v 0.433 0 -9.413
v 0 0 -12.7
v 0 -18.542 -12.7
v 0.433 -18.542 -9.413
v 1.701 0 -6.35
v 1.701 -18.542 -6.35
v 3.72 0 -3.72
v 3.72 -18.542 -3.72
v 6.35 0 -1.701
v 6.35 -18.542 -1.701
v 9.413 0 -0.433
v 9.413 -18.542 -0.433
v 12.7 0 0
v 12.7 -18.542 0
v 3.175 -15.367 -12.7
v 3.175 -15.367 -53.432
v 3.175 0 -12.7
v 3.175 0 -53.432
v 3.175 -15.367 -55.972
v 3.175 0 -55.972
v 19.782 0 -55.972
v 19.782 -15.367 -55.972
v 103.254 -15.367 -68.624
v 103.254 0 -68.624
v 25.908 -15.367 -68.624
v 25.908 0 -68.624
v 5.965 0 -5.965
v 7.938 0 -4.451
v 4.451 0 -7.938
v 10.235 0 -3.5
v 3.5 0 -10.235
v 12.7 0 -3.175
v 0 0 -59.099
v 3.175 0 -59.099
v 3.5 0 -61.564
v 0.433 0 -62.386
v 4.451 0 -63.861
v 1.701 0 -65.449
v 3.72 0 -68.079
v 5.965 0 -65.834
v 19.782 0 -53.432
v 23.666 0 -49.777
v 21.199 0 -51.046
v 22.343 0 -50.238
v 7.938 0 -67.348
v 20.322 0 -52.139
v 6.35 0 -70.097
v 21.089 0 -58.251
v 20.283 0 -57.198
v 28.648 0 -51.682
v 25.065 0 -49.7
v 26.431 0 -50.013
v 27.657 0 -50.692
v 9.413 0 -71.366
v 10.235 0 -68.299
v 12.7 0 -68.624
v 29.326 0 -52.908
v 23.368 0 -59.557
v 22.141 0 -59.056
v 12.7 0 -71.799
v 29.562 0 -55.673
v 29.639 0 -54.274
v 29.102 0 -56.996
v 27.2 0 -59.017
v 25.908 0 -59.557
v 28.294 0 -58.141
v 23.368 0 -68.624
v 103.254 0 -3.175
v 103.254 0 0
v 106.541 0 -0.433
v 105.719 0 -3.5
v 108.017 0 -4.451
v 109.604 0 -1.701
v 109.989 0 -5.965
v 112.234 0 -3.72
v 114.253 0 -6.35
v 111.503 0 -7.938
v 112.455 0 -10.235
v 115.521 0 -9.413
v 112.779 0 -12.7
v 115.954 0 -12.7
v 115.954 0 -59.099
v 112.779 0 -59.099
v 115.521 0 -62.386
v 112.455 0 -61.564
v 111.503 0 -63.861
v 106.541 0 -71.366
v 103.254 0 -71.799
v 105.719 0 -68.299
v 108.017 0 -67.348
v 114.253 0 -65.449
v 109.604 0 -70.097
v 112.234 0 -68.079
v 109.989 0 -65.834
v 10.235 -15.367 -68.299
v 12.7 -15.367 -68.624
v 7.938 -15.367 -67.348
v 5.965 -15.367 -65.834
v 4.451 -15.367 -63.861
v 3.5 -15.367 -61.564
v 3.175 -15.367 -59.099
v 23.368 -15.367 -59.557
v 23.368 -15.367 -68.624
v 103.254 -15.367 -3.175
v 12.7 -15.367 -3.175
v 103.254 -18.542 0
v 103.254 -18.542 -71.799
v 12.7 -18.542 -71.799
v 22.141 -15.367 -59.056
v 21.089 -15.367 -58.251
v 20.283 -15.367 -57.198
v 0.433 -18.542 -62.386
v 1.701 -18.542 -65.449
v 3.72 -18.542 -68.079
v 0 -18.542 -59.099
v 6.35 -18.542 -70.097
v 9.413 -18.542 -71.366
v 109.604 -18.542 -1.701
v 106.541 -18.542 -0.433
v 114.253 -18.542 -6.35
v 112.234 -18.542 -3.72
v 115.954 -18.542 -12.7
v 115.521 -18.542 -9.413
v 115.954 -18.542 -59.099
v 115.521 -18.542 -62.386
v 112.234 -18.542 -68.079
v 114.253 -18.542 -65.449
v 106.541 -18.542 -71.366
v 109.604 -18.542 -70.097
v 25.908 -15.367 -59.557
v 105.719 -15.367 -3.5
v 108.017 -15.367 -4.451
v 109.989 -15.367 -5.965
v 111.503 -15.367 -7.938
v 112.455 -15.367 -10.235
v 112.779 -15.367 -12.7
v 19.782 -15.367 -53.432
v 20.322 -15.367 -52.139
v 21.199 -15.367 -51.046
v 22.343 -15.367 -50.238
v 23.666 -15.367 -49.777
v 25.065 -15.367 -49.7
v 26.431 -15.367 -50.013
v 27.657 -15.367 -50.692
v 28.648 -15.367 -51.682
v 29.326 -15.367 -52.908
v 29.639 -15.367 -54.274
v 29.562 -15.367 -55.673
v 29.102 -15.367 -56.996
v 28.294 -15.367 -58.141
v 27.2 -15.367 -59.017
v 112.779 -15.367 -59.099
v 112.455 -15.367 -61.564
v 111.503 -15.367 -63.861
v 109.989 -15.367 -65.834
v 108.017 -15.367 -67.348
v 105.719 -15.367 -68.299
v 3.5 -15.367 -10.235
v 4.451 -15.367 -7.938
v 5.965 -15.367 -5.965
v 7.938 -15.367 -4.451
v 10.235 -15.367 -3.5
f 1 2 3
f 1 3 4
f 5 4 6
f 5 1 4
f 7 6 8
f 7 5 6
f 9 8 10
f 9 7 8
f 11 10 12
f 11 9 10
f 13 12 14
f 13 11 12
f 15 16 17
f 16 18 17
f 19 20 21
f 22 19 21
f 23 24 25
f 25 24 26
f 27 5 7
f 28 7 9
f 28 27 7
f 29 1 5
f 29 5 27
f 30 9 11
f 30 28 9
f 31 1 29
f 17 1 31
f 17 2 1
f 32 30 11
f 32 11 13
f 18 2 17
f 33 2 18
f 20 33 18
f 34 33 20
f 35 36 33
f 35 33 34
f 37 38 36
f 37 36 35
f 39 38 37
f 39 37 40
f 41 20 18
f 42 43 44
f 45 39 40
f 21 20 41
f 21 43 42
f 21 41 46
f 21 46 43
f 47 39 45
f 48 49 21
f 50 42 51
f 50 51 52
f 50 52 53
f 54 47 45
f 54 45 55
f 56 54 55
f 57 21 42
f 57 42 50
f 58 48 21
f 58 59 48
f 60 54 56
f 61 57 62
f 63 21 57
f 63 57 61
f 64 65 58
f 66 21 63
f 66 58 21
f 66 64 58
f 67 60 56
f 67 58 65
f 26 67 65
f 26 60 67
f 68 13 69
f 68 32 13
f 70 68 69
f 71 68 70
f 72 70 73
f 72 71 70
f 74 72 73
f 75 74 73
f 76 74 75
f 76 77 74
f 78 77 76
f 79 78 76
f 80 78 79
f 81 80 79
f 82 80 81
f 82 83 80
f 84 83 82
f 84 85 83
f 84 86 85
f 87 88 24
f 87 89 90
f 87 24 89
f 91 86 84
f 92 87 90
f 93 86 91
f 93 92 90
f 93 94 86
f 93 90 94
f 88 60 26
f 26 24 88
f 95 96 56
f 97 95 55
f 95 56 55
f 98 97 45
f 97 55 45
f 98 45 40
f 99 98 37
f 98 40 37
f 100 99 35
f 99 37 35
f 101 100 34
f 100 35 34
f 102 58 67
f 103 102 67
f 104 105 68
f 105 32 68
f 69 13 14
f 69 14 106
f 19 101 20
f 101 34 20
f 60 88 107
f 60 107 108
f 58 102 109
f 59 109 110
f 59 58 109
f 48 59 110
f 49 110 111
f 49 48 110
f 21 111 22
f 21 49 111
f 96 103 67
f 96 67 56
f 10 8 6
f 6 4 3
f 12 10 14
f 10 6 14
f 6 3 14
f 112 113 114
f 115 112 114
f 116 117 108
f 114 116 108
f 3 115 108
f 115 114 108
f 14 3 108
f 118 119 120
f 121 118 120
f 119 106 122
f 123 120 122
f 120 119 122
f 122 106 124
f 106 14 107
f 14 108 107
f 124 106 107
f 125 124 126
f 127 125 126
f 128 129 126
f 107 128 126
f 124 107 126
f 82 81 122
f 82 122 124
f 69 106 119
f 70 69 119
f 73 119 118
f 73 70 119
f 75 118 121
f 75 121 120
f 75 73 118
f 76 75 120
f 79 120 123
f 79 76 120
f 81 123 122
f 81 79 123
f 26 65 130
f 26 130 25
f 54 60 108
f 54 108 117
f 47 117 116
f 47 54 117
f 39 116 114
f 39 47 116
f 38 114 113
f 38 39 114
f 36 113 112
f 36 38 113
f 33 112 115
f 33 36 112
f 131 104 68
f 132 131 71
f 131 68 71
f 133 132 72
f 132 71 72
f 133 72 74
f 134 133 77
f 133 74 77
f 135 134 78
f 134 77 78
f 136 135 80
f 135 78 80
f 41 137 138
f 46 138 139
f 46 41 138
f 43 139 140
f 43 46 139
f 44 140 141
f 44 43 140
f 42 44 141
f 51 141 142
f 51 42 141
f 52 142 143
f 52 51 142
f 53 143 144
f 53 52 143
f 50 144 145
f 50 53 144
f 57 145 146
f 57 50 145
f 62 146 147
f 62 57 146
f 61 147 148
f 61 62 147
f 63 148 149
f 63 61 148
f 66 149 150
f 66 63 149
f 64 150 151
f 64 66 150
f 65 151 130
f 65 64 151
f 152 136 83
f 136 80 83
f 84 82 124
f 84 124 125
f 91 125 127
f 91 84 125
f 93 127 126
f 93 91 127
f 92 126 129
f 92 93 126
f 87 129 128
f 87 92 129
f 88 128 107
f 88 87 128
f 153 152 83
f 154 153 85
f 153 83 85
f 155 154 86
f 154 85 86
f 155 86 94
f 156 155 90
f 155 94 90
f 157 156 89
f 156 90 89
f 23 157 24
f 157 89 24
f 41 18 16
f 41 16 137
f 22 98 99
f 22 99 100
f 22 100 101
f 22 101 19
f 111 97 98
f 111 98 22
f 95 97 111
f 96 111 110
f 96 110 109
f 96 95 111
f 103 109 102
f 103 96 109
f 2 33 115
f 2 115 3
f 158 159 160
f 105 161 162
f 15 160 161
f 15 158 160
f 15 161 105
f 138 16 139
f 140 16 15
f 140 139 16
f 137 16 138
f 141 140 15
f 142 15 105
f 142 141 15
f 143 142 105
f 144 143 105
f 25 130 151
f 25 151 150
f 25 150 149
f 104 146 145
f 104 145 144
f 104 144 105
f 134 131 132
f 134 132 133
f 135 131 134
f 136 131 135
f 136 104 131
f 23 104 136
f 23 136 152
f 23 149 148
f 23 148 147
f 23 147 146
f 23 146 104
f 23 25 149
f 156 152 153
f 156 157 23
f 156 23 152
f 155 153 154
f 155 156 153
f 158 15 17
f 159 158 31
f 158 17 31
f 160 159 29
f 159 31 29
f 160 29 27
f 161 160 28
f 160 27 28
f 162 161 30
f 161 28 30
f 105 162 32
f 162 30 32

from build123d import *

# Parameters (mm, degrees)
BOSS_EXTRUDE1_DEPTH = 18.542
SHELL1_T            = -3.175
BOSS_EXTRUDE2_REACH = 139.638
SKETCH2_R           = 5.019286765
RIB1_REACH          = 139.638
SKETCH3_WALLS_W     = 293.719610529
SKETCH3_WALLS_H     = 2.54
SKETCH3_WALLS_W_2   = 2.54
SKETCH3_WALLS_H_2   = 286.179283193


with BuildPart() as part:
    # Sketch1 → Boss-Extrude1 (new body)
    with BuildSketch(Plane(origin=(0, 0, 0), x_dir=(1, 0, 0), z_dir=(0, 1, 0))):
        with BuildLine():
            Line((12.7, 0), (103.254058747, 0))
            ThreePointArc((103.254058747, 0), (112.234314868, 3.719743879), (115.954058747, 12.7))
            Line((115.954058747, 12.7), (115.954058747, 59.098953312))
            ThreePointArc((115.954058747, 59.098953312), (112.234314868, 68.079209433), (103.254058747, 71.798953312))
            Line((103.254058747, 71.798953312), (12.7, 71.798953312))
            ThreePointArc((12.7, 71.798953312), (3.719743879, 68.079209433), (0, 59.098953312))
            Line((0, 59.098953312), (0, 12.7))
            ThreePointArc((0, 12.7), (3.719743879, 3.719743879), (12.7, 0))
        make_face()
    extrude(amount=-BOSS_EXTRUDE1_DEPTH)

    # Shell1
    shell1_openings = [part.faces().sort_by_distance(p)[0] for p in [
        (57.977029373, 0, -35.899476656),
    ]]
    offset(amount=SHELL1_T, openings=shell1_openings, kind=Kind.INTERSECTION)

    # Sketch2 → Boss-Extrude2 (add, up to next)
    with BuildSketch(Plane(origin=(0, 0, 0), x_dir=(1, 0, 0), z_dir=(0, 1, 0)), mode=Mode.PRIVATE) as boss_extrude2_sk1:
        with Locations(Location((24.637750849, 54.7015298, 0), (0, 0, 270))):
            Circle(SKETCH2_R)
    boss_extrude2_tool1 = extrude(boss_extrude2_sk1.sketch, amount=-BOSS_EXTRUDE2_REACH, mode=Mode.PRIVATE) - part.part
    add(boss_extrude2_tool1.solids().sort_by_distance((24.637751, 0, -54.70153))[0])

    # Sketch3 walls → Rib1 (add, up to next)
    with BuildSketch(Plane(origin=(0, 0, 0), x_dir=(1, 0, 0), z_dir=(0, 1, 0)), mode=Mode.PRIVATE) as rib1_sk1:
        with Locations((11.396732042, 54.7015298)):
            Rectangle(SKETCH3_WALLS_W, SKETCH3_WALLS_H)
    rib1_tool1 = extrude(rib1_sk1.sketch, amount=-RIB1_REACH, mode=Mode.PRIVATE) - part.part
    # Sketch3 walls → Rib1 (add, up to next)
    with BuildSketch(Plane(origin=(0, 0, 0), x_dir=(1, 0, 0), z_dir=(0, 1, 0)), mode=Mode.PRIVATE) as rib1_sk2:
        with Locations((24.637750849, 64.172384939)):
            Rectangle(SKETCH3_WALLS_W_2, SKETCH3_WALLS_H_2)
    rib1_tool2 = extrude(rib1_sk2.sketch, amount=-RIB1_REACH, mode=Mode.PRIVATE) - part.part
    add(rib1_tool1.solids().sort_by_distance((11.396732042, 0, -54.7015298))[0])
    add(rib1_tool2.solids().sort_by_distance((24.637750849, 0, -64.172384939))[0])


solid = part.part
